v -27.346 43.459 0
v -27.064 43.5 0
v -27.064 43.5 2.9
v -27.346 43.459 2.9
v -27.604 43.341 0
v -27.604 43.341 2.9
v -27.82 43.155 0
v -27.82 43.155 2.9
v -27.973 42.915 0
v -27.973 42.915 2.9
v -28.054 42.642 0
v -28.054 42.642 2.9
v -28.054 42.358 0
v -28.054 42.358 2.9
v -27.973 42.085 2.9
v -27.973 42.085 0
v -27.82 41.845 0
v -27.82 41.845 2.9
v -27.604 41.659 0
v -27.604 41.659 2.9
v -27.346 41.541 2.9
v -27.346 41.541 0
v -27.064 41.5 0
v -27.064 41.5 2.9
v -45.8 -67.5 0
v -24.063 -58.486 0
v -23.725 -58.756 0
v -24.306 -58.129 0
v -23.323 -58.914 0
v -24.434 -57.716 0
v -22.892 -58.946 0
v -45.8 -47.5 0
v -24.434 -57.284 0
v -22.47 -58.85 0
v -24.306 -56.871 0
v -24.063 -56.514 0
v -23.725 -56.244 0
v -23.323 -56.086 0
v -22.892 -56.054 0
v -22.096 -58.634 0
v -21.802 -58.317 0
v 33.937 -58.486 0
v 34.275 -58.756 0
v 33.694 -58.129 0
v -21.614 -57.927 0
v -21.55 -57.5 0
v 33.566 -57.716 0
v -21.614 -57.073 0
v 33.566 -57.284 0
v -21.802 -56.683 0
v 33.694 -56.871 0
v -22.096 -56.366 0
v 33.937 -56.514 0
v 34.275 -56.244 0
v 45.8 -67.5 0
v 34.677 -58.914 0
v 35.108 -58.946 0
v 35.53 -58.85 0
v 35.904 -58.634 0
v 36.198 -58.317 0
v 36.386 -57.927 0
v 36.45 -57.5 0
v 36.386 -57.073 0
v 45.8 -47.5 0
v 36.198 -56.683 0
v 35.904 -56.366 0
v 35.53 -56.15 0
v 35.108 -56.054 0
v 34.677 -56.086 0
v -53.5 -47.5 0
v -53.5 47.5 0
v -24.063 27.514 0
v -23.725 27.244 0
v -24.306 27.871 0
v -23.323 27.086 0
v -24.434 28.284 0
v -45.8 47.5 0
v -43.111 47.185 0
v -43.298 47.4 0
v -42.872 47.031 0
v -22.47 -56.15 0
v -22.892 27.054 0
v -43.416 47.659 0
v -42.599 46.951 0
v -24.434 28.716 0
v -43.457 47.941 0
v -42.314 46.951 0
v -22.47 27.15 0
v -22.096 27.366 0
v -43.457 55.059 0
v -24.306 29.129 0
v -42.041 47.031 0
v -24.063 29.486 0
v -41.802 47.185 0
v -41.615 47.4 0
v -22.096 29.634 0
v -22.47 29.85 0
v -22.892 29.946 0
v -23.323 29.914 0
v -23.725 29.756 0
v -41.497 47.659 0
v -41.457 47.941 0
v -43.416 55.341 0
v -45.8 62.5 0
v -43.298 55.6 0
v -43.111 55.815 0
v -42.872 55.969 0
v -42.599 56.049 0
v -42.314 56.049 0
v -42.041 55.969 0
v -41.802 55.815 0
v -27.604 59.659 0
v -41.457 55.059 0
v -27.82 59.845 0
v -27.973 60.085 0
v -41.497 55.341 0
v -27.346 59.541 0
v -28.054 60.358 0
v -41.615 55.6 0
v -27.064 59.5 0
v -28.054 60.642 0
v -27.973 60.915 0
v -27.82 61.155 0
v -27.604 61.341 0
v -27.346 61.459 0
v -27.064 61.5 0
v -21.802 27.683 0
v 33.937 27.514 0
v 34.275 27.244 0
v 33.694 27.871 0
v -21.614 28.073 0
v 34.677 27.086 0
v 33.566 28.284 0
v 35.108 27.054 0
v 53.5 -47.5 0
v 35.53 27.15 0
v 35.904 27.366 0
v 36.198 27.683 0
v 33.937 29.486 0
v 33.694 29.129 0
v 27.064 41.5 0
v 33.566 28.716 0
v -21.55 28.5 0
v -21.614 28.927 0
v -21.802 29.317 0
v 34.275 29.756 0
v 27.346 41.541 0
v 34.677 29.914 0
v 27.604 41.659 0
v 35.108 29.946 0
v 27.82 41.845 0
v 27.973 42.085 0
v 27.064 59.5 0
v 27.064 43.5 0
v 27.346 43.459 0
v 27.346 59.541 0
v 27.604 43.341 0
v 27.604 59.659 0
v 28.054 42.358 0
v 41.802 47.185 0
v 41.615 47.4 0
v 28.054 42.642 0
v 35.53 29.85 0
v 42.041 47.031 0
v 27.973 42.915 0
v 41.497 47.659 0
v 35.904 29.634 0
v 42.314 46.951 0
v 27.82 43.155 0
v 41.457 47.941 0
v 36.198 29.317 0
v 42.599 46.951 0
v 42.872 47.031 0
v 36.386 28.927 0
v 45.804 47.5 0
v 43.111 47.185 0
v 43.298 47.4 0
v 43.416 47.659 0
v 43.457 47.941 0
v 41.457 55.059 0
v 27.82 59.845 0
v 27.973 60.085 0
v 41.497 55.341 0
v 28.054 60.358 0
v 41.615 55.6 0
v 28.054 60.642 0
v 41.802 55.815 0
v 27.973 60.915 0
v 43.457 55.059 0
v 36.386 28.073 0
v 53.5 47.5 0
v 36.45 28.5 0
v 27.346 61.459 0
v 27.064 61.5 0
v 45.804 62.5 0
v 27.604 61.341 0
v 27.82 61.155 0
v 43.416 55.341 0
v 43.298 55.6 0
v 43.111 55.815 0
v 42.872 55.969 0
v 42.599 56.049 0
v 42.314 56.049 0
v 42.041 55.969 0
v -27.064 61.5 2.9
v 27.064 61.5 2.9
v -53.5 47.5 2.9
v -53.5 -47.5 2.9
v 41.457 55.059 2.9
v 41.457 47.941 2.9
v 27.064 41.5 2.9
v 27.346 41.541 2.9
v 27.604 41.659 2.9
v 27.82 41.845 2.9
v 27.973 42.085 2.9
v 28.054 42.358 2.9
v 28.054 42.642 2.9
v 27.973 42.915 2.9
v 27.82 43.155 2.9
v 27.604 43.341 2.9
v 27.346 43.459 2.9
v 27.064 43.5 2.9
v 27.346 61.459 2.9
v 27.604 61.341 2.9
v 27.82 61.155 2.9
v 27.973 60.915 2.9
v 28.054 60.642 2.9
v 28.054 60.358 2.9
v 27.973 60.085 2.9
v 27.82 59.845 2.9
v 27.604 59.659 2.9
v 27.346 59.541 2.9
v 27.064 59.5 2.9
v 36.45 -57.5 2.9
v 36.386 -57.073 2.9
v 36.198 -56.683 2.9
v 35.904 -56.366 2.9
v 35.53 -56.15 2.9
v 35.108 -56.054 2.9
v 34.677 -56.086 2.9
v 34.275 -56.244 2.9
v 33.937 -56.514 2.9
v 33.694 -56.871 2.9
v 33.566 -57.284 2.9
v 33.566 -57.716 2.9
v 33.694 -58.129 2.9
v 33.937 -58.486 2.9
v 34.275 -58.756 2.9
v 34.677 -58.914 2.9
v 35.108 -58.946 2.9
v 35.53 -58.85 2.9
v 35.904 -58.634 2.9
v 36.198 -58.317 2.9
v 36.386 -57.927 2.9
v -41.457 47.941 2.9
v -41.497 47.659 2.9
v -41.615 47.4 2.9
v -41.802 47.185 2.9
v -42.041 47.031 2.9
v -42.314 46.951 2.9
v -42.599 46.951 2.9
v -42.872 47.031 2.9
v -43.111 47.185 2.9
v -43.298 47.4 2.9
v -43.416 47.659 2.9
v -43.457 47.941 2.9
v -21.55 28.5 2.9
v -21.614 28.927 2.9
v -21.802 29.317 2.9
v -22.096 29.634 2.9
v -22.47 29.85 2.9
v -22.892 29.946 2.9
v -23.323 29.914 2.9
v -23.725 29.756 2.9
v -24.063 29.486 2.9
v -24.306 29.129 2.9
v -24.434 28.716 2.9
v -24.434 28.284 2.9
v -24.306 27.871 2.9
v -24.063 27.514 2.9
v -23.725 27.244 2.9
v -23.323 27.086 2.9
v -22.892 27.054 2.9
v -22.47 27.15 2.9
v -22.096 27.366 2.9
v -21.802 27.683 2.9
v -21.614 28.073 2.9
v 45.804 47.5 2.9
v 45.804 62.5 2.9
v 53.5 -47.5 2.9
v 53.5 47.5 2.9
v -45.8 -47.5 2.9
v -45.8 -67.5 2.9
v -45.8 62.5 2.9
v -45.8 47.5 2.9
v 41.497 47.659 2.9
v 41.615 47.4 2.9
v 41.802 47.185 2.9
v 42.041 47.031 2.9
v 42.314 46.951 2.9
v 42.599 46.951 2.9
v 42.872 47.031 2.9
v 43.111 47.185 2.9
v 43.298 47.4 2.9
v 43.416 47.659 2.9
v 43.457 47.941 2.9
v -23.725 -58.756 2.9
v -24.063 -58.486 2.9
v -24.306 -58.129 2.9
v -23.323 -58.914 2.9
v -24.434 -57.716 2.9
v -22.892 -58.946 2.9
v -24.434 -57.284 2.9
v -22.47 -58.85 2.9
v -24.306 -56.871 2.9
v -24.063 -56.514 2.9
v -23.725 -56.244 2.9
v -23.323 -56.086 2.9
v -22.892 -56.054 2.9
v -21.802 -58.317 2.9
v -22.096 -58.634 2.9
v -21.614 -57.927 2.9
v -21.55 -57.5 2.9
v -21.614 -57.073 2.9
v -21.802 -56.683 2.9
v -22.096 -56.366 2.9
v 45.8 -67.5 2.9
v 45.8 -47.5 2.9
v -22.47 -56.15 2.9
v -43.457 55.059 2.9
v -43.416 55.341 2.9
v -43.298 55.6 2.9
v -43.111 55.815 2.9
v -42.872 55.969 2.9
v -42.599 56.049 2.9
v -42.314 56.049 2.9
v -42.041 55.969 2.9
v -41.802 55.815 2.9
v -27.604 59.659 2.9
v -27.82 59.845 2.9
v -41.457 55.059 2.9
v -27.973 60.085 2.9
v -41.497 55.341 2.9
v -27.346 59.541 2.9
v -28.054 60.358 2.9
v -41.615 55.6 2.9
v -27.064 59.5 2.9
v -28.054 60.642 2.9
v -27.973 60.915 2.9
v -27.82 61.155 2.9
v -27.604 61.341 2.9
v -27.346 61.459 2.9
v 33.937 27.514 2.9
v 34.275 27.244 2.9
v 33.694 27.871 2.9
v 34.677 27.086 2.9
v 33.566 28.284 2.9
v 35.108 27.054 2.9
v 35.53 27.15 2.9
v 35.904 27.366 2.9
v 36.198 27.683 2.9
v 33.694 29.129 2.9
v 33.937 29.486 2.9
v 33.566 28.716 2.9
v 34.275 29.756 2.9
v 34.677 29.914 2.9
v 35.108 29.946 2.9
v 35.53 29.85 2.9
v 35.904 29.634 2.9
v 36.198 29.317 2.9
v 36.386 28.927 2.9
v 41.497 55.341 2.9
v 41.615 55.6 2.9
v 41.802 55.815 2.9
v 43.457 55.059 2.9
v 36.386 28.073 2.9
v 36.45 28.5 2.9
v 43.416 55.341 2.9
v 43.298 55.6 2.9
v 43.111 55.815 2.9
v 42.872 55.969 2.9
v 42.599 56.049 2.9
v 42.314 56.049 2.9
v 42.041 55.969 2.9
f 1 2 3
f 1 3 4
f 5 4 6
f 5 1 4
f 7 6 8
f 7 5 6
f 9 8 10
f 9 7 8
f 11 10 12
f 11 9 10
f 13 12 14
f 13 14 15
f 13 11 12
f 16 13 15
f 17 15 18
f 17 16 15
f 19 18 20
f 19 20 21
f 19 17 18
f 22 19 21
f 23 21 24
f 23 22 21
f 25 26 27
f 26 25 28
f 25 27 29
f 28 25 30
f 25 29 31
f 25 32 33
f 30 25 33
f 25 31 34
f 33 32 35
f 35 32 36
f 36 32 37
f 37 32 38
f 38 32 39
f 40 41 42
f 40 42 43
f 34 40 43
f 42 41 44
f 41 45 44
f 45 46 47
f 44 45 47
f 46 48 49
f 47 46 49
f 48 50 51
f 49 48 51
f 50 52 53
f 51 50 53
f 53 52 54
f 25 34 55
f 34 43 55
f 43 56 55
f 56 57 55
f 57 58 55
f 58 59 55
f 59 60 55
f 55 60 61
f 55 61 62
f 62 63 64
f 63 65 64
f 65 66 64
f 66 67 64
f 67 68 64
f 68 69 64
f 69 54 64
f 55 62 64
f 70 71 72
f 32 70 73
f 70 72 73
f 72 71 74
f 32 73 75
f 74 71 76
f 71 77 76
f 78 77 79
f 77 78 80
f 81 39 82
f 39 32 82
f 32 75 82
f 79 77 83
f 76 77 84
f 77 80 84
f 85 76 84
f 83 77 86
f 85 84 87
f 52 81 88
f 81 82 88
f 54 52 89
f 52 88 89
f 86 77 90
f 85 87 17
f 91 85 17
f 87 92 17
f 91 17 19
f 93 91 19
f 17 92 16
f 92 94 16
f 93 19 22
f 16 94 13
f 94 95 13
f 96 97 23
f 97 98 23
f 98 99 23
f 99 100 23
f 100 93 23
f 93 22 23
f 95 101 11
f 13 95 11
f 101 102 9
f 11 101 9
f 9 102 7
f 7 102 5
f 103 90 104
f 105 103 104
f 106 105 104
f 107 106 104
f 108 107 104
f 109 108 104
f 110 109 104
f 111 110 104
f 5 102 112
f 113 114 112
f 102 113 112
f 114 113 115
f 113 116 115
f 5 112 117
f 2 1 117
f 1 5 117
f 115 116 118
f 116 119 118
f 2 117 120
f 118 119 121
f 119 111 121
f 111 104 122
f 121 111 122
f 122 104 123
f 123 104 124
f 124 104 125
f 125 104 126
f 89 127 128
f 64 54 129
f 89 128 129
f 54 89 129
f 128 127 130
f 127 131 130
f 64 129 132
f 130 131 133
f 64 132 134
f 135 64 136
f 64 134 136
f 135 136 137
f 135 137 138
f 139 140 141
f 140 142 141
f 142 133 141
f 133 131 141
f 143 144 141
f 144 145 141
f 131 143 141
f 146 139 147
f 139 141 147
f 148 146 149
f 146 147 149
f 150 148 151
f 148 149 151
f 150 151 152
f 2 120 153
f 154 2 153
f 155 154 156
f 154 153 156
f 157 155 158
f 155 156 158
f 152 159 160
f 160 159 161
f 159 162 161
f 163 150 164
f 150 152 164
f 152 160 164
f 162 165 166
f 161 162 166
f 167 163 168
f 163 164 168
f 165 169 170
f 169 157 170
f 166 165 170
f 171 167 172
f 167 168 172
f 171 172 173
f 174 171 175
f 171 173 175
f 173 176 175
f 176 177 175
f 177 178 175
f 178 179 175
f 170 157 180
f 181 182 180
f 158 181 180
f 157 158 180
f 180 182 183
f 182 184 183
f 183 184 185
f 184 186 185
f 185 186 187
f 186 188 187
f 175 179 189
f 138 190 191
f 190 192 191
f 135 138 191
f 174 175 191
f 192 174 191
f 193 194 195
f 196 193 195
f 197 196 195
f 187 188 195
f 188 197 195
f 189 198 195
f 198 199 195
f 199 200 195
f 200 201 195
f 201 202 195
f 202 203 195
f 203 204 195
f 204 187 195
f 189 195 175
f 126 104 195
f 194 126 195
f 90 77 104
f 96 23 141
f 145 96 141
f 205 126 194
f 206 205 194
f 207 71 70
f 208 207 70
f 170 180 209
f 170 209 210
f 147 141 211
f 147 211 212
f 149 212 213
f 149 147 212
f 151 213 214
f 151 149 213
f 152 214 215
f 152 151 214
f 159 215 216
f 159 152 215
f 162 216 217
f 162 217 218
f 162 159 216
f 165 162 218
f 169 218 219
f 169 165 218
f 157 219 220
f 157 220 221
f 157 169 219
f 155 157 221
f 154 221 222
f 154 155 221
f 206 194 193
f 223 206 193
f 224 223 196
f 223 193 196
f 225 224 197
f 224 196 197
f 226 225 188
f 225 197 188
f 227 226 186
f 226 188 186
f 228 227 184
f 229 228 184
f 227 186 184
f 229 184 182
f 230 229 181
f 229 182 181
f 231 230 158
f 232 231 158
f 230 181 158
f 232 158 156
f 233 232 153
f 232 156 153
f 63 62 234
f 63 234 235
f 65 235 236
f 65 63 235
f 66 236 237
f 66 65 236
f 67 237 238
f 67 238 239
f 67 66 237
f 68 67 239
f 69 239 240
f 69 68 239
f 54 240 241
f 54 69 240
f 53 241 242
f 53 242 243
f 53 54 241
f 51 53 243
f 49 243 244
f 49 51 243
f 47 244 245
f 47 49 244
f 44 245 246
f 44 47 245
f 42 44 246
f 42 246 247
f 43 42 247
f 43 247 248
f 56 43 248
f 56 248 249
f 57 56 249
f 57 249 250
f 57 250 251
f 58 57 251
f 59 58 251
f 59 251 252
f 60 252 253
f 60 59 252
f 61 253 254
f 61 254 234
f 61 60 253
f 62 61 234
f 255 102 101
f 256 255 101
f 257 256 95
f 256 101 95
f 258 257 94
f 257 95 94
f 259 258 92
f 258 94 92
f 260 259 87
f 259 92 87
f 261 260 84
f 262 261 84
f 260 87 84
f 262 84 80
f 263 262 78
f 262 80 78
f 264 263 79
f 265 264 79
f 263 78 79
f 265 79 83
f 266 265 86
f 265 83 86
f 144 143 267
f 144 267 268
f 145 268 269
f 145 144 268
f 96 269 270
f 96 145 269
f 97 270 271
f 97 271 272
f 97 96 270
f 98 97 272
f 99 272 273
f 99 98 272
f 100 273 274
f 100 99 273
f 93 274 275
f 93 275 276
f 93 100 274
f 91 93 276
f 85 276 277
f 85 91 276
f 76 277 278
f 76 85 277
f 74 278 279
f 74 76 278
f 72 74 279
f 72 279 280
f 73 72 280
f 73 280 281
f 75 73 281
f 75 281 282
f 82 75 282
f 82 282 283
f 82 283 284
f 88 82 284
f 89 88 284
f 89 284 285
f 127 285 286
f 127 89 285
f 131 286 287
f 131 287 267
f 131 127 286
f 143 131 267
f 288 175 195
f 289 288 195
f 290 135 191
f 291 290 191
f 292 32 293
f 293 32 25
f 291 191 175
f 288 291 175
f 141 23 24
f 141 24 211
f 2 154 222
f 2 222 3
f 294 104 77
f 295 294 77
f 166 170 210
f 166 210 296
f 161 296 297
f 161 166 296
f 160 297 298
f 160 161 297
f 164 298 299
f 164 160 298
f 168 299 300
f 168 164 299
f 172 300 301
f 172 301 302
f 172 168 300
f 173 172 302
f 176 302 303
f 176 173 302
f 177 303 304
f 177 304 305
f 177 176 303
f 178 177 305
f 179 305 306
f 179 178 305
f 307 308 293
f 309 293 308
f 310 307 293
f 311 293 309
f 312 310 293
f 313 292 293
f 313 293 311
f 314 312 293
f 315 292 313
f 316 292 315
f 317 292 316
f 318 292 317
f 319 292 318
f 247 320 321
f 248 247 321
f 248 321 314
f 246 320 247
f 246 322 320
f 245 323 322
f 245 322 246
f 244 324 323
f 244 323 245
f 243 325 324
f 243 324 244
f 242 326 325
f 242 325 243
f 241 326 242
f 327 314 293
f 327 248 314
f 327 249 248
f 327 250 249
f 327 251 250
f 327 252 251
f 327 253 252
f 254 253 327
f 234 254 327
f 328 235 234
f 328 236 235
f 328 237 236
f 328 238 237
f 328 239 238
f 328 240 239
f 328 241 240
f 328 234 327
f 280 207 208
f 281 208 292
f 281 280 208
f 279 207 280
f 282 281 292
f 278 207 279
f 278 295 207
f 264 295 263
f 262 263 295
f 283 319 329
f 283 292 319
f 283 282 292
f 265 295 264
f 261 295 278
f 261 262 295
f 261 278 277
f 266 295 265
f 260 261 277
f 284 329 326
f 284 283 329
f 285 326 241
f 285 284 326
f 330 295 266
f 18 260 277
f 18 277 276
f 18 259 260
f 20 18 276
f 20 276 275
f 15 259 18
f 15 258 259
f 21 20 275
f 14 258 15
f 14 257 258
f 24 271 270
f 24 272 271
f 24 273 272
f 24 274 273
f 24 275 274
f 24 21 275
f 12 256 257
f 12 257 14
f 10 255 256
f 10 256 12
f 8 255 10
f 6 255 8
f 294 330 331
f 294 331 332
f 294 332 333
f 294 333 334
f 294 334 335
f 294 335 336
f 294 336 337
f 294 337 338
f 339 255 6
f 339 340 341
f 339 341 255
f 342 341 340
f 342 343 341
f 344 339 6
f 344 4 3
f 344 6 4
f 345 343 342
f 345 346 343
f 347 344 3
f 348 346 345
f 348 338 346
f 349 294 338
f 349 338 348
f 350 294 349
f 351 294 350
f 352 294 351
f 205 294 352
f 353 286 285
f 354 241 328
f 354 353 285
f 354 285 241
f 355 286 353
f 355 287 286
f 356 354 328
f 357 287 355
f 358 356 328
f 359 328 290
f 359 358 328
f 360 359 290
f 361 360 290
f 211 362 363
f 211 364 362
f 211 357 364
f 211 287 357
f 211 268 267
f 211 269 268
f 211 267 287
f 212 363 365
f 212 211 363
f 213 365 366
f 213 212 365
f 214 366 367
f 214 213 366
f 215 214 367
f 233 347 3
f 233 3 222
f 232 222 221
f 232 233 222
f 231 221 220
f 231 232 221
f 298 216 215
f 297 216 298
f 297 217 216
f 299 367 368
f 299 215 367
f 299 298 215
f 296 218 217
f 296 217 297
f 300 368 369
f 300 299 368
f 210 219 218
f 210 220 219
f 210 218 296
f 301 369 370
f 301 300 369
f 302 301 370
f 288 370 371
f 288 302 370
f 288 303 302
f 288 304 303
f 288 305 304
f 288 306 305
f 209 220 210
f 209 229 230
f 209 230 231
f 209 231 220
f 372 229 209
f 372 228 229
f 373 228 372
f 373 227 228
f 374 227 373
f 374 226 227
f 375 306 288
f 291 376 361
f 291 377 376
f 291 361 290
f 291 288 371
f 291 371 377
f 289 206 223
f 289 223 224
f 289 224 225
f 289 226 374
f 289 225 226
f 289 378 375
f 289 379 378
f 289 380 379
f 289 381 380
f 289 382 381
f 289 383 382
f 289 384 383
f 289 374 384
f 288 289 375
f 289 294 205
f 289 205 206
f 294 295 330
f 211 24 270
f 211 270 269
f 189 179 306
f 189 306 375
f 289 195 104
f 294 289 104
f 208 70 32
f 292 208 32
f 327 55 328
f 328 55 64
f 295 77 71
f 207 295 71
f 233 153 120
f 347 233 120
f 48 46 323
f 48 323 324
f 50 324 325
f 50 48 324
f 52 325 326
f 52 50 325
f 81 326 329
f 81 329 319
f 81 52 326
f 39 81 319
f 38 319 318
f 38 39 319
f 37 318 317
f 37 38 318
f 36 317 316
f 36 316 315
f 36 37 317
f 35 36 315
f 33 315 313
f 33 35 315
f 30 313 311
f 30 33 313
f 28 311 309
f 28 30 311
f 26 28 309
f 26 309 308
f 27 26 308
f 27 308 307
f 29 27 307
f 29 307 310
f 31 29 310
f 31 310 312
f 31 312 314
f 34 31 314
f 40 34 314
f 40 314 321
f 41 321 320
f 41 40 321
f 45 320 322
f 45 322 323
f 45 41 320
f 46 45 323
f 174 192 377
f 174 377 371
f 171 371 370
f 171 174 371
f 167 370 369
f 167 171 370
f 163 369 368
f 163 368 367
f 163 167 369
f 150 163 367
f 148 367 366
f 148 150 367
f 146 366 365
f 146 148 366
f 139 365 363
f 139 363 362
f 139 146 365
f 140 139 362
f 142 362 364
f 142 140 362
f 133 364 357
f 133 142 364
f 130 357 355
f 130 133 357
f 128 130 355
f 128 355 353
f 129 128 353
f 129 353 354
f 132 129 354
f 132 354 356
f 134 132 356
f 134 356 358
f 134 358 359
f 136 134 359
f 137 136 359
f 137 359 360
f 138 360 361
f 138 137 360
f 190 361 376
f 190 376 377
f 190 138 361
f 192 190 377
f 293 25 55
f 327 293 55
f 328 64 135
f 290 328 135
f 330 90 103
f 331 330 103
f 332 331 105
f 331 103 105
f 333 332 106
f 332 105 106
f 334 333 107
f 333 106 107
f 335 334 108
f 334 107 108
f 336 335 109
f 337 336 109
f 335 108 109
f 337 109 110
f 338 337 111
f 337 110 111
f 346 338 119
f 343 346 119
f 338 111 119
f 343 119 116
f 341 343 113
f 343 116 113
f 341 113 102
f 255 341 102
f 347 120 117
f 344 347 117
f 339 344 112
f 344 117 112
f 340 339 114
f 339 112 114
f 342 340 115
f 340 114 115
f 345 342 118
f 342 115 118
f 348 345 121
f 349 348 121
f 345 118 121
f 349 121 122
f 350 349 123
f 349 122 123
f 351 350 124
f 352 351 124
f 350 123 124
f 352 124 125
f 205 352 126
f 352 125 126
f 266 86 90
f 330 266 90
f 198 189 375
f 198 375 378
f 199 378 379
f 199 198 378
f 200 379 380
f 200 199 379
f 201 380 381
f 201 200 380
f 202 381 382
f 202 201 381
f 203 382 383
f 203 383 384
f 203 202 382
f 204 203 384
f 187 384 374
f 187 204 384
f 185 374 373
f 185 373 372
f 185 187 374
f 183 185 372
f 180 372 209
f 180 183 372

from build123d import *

# Parameters (mm, degrees)
SKETCH1_R           = 1.45
BOSS_EXTRUDE2_DEPTH = 2.9


with BuildPart() as part:
    # Sketch1 → Boss-Extrude2 (new body)
    with BuildSketch(Plane.XY):
        Polygon((-53.5, -47.5), (-45.8, -47.5), (-45.8, -67.5), (45.8, -67.5), (45.8, -47.5), (53.5, -47.5), (53.5, 47.5), (45.803905178, 47.5), (45.803905178, 62.5), (-45.8, 62.5), (-45.8, 47.5), (-53.5, 47.5), align=None)
        with Locations((35, -57.5)):
            Circle(SKETCH1_R, mode=Mode.SUBTRACT)
        with Locations((35, 28.5)):
            Circle(SKETCH1_R, mode=Mode.SUBTRACT)
        with Locations((-23, -57.5)):
            Circle(SKETCH1_R, mode=Mode.SUBTRACT)
        with Locations((-23, 28.5)):
            Circle(SKETCH1_R, mode=Mode.SUBTRACT)
        with BuildLine():
            Line((-27.063854383, 61.5), (27.063854383, 61.5))
            ThreePointArc((27.063854383, 61.5), (28.063854383, 60.5), (27.063854383, 59.5))
            Line((27.063854383, 59.5), (-27.063854383, 59.5))
            ThreePointArc((-27.063854383, 59.5), (-28.063854383, 60.5), (-27.063854383, 61.5))
        make_face(mode=Mode.SUBTRACT)
        with BuildLine():
            Line((-27.063854383, 41.5), (27.063854383, 41.5))
            ThreePointArc((27.063854383, 41.5), (28.063854383, 42.5), (27.063854383, 43.5))
            Line((27.063854383, 43.5), (-27.063854383, 43.5))
            ThreePointArc((-27.063854383, 43.5), (-28.063854383, 42.5), (-27.063854383, 41.5))
        make_face(mode=Mode.SUBTRACT)
        with BuildLine():
            Line((-41.456619421, 55.059017376), (-41.456619421, 47.940982624))
            ThreePointArc((-41.456619421, 47.940982624), (-42.456619421, 46.940982624), (-43.456619421, 47.940982624))
            Line((-43.456619421, 47.940982624), (-43.456619421, 55.059017376))
            ThreePointArc((-43.456619421, 55.059017376), (-42.456619421, 56.059017376), (-41.456619421, 55.059017376))
        make_face(mode=Mode.SUBTRACT)
        with BuildLine():
            Line((41.456619421, 55.059017376), (41.456619421, 47.940982624))
            ThreePointArc((41.456619421, 47.940982624), (42.456619421, 46.940982624), (43.456619421, 47.940982624))
            Line((43.456619421, 47.940982624), (43.456619421, 55.059017376))
            ThreePointArc((43.456619421, 55.059017376), (42.456619421, 56.059017376), (41.456619421, 55.059017376))
        make_face(mode=Mode.SUBTRACT)
    extrude(amount=BOSS_EXTRUDE2_DEPTH)


solid = part.part
